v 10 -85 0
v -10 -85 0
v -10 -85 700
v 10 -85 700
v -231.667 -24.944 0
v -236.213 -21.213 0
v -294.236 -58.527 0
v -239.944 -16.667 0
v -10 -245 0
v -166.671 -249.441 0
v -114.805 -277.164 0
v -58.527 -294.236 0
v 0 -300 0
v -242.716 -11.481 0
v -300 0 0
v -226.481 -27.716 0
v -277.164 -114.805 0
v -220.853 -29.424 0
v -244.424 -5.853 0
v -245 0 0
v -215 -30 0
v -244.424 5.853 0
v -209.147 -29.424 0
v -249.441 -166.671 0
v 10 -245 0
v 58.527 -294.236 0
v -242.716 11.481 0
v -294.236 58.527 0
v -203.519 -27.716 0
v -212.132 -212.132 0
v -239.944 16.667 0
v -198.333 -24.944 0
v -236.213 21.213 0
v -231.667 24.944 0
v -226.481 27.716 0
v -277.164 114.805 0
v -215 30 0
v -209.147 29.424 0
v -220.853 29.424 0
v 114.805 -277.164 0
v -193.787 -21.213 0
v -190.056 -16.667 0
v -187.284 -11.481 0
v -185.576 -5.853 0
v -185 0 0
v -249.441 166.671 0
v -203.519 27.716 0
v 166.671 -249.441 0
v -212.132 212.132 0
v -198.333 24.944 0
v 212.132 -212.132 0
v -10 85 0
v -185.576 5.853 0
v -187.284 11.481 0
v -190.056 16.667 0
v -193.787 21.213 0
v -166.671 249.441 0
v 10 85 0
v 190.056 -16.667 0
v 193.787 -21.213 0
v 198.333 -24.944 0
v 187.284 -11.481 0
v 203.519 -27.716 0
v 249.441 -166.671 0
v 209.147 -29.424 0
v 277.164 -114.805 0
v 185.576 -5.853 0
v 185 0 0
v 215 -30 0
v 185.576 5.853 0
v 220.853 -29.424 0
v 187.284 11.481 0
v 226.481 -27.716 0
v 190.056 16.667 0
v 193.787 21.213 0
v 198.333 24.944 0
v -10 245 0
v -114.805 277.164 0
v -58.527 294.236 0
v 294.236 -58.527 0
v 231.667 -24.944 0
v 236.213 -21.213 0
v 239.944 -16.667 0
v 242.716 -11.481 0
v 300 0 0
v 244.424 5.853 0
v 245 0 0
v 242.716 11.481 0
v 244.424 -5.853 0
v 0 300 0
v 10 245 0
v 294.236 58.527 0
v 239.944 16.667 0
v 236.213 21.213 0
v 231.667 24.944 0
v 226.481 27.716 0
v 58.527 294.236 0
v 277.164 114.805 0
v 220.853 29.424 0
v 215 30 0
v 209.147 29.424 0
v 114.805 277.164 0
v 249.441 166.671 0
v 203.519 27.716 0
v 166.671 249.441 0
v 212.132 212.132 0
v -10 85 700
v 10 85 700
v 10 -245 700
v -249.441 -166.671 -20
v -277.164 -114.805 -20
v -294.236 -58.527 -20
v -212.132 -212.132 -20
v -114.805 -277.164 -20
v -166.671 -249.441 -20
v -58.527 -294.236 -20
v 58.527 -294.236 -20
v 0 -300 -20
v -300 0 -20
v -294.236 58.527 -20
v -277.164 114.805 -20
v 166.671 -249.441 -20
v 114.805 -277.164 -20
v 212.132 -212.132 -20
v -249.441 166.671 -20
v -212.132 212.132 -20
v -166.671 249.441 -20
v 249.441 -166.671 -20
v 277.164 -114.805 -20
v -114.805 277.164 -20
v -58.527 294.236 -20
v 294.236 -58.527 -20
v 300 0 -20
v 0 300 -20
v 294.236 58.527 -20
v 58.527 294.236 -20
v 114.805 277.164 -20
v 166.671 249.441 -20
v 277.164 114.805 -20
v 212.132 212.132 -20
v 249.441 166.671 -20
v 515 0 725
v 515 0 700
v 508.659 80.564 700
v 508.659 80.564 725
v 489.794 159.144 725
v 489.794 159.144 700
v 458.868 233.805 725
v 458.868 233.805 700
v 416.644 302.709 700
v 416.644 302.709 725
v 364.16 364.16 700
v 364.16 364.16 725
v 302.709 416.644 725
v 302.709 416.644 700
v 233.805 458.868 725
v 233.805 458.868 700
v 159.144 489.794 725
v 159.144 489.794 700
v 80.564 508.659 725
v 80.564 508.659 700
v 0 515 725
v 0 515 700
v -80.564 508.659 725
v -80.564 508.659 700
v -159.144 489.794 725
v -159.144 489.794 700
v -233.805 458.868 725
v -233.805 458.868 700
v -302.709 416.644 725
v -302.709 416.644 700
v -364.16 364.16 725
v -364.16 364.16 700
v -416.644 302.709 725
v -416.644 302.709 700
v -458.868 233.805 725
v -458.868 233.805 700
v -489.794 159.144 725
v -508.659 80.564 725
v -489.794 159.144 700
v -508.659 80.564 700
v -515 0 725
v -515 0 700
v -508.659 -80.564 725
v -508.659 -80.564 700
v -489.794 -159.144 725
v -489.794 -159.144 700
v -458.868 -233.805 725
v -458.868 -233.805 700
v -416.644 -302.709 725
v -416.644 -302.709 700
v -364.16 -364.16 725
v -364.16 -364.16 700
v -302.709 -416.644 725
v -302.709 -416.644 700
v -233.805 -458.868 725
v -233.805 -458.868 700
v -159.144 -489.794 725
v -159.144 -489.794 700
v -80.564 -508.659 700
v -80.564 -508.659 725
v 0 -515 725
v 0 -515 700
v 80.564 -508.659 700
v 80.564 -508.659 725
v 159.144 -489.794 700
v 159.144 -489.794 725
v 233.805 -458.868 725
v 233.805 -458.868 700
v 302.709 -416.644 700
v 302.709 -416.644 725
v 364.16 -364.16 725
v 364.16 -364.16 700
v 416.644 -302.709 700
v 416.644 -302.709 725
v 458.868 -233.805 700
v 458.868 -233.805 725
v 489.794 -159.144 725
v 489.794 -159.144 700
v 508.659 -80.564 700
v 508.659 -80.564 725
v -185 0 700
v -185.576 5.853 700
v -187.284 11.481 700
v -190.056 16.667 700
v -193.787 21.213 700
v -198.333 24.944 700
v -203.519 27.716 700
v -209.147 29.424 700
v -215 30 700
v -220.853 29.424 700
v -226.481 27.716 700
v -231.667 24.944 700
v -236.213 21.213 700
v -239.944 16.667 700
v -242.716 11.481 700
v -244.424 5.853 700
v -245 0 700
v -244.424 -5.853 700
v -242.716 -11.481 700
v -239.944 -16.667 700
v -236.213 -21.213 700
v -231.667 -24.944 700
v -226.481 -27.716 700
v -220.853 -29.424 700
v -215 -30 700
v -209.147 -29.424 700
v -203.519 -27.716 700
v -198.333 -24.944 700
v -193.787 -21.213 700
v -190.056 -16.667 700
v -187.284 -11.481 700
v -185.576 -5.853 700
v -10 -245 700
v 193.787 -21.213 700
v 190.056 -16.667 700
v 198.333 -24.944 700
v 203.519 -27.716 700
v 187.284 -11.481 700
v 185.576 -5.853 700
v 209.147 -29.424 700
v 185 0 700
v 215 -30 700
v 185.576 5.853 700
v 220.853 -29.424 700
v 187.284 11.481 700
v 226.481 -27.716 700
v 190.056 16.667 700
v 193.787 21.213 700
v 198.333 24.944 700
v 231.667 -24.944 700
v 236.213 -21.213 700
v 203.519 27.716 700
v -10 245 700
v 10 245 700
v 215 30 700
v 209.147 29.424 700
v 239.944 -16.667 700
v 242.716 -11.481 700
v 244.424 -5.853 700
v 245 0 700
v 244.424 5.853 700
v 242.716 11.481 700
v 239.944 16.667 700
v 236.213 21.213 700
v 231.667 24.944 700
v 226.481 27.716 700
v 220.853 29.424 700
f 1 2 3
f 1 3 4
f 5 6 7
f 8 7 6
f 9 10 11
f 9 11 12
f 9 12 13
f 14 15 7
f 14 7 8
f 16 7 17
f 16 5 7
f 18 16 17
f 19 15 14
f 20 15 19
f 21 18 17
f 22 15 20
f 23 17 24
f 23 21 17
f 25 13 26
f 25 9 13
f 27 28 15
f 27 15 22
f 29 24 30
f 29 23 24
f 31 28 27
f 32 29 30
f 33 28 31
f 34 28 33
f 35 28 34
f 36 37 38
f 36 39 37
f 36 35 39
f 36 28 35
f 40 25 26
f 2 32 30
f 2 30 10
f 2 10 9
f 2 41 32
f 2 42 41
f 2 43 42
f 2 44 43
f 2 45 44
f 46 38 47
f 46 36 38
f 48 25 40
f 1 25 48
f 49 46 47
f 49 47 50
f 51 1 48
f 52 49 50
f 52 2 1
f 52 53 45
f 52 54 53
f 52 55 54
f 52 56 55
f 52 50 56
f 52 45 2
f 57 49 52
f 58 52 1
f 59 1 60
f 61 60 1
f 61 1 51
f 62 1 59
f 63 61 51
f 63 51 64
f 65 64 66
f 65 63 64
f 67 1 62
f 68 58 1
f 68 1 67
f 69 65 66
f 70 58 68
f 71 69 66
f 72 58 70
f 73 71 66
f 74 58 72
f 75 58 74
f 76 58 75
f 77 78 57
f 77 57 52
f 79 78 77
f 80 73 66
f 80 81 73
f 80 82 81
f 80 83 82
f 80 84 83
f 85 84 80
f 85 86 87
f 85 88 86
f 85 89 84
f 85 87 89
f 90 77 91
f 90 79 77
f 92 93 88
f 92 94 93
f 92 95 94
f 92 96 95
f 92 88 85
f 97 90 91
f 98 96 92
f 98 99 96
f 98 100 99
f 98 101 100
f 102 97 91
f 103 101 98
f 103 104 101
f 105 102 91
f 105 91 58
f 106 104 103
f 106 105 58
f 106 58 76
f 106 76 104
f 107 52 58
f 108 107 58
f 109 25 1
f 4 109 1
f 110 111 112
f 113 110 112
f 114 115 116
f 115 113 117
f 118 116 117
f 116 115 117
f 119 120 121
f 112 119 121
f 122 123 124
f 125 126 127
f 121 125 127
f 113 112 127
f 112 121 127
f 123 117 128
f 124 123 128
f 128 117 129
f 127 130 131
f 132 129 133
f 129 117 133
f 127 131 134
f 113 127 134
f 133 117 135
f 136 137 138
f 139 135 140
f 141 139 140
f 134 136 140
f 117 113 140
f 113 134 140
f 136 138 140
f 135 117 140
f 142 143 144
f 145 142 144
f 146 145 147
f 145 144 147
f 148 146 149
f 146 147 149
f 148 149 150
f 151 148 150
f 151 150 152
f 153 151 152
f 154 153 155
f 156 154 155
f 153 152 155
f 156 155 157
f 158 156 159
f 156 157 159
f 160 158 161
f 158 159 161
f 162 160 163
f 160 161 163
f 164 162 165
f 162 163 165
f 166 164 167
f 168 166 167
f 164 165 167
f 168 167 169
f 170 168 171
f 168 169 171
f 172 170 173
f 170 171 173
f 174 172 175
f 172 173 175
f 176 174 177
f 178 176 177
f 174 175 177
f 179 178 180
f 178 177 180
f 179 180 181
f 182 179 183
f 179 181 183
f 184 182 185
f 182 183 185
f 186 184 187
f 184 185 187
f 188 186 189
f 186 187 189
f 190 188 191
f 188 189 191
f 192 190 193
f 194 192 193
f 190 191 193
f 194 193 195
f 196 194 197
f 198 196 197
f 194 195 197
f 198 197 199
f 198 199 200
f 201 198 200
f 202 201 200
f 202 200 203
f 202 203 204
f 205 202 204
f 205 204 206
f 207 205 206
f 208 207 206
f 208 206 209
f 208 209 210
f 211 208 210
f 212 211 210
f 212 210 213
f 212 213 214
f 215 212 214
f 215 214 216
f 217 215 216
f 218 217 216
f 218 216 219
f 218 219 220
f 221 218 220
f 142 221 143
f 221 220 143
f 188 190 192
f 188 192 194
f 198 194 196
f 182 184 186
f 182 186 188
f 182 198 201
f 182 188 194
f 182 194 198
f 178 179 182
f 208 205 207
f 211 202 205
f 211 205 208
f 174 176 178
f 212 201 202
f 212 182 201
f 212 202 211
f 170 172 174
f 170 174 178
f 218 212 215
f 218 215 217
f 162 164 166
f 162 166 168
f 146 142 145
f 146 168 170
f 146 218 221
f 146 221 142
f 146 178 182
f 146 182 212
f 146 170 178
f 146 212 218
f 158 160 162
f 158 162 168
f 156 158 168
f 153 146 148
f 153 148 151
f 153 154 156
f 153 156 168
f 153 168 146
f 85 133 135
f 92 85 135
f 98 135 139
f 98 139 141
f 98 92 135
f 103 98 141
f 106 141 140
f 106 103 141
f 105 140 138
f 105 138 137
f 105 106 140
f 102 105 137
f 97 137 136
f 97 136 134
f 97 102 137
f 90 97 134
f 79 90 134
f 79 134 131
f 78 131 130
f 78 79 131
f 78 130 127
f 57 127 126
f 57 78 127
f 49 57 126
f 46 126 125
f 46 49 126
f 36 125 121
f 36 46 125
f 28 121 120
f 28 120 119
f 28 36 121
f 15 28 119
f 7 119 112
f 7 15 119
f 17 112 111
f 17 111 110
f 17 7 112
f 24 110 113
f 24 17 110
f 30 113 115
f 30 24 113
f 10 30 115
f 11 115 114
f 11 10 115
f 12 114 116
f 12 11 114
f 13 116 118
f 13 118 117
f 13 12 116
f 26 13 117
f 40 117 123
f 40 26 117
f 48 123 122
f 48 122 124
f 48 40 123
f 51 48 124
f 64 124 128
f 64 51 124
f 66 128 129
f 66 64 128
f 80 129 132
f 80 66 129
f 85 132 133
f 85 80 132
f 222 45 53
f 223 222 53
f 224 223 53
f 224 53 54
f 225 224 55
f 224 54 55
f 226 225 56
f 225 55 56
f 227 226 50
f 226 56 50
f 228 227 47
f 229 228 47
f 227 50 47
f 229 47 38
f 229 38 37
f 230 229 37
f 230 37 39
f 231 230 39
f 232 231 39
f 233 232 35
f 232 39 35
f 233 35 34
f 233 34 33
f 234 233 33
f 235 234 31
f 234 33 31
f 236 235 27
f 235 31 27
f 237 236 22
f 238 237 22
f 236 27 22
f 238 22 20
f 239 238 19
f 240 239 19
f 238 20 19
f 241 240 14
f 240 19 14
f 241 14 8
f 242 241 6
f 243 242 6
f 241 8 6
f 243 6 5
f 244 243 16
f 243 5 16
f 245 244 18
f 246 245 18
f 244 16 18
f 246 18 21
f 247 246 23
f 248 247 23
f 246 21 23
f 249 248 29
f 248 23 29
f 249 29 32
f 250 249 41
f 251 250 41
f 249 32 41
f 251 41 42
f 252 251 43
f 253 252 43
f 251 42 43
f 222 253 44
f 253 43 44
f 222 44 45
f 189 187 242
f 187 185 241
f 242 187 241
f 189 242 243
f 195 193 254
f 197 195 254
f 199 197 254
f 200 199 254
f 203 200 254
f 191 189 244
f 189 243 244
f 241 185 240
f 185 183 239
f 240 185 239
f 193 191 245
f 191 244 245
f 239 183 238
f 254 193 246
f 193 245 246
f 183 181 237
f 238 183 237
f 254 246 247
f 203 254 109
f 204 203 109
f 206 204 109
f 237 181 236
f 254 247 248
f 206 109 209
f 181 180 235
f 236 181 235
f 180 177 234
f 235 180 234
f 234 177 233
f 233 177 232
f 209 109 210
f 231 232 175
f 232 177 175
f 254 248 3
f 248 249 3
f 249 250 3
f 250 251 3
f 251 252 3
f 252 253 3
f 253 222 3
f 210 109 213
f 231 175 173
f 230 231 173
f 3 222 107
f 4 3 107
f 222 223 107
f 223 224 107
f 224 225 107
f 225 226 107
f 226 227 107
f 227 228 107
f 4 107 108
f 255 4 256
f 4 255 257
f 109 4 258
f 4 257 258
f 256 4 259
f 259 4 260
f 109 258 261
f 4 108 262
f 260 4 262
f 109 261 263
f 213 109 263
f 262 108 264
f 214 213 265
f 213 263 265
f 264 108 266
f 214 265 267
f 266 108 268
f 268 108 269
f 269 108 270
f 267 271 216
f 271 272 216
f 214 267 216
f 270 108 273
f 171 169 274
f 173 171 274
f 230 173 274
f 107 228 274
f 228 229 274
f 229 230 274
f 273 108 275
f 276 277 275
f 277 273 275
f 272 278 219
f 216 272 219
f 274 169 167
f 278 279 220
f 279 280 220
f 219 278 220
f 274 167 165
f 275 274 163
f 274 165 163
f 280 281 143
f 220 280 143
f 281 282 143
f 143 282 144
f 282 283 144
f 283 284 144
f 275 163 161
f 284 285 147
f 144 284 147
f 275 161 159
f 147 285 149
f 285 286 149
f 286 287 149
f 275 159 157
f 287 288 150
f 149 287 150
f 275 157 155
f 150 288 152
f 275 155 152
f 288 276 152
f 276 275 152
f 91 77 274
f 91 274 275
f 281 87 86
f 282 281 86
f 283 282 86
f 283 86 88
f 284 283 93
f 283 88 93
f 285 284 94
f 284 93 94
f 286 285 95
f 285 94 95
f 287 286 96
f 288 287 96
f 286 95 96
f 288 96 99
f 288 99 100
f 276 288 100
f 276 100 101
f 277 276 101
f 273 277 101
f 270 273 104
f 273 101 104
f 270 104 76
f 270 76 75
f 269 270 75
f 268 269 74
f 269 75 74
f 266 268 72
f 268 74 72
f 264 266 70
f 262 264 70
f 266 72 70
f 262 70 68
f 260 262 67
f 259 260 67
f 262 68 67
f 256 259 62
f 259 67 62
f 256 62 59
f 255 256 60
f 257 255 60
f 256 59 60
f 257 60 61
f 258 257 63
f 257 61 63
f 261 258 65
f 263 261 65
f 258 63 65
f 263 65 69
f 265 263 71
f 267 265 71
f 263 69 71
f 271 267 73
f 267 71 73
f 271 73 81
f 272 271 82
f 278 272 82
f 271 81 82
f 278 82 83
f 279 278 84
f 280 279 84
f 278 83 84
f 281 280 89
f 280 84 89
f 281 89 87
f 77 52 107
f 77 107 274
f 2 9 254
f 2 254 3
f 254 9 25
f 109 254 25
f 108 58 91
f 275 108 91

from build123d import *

# Parameters (mm, degrees)
F0_R     = 300
F0_W     = 20
F0_H     = 160
F0_R_2   = 30
F1_DEPTH = 20
F2_DEPTH = 700
F3_R     = 515
F4_DEPTH = 25


with BuildPart() as f1:
    # F0 (on Top) → F1 (new body)
    with BuildSketch(Plane.XY):
        Circle(F0_R)
        with Locations((0, -165)):
            Rectangle(F0_W, F0_H, mode=Mode.SUBTRACT)
        with Locations((-215, 0)):
            Circle(F0_R_2, mode=Mode.SUBTRACT)
        with Locations((215, 0)):
            Circle(F0_R_2, mode=Mode.SUBTRACT)
        with Locations((0, 165)):
            Rectangle(F0_W, F0_H, mode=Mode.SUBTRACT)
        with Locations((0, -165)):
            Rectangle(F0_W, F0_H)
        with Locations((0, 165)):
            Rectangle(F0_W, F0_H)
        with Locations((215, 0)):
            Circle(F0_R_2)
        with Locations((-215, 0)):
            Circle(F0_R_2)
    extrude(amount=-F1_DEPTH)

    # F0 (on Top) → F2 (join)
    with BuildSketch(Plane.XY):
        with Locations((215, 0)):
            Circle(F0_R_2)
        with Locations((-215, 0)):
            Circle(F0_R_2)
        with Locations((0, -165)):
            Rectangle(F0_W, F0_H)
        with Locations((0, 165)):
            Rectangle(F0_W, F0_H)
    extrude(amount=F2_DEPTH)

    # F3 (on face) → F4 (join)
    with BuildSketch(Plane.XY.offset(700)):
        Circle(F3_R)
    extrude(amount=F4_DEPTH)


solid = f1.part
